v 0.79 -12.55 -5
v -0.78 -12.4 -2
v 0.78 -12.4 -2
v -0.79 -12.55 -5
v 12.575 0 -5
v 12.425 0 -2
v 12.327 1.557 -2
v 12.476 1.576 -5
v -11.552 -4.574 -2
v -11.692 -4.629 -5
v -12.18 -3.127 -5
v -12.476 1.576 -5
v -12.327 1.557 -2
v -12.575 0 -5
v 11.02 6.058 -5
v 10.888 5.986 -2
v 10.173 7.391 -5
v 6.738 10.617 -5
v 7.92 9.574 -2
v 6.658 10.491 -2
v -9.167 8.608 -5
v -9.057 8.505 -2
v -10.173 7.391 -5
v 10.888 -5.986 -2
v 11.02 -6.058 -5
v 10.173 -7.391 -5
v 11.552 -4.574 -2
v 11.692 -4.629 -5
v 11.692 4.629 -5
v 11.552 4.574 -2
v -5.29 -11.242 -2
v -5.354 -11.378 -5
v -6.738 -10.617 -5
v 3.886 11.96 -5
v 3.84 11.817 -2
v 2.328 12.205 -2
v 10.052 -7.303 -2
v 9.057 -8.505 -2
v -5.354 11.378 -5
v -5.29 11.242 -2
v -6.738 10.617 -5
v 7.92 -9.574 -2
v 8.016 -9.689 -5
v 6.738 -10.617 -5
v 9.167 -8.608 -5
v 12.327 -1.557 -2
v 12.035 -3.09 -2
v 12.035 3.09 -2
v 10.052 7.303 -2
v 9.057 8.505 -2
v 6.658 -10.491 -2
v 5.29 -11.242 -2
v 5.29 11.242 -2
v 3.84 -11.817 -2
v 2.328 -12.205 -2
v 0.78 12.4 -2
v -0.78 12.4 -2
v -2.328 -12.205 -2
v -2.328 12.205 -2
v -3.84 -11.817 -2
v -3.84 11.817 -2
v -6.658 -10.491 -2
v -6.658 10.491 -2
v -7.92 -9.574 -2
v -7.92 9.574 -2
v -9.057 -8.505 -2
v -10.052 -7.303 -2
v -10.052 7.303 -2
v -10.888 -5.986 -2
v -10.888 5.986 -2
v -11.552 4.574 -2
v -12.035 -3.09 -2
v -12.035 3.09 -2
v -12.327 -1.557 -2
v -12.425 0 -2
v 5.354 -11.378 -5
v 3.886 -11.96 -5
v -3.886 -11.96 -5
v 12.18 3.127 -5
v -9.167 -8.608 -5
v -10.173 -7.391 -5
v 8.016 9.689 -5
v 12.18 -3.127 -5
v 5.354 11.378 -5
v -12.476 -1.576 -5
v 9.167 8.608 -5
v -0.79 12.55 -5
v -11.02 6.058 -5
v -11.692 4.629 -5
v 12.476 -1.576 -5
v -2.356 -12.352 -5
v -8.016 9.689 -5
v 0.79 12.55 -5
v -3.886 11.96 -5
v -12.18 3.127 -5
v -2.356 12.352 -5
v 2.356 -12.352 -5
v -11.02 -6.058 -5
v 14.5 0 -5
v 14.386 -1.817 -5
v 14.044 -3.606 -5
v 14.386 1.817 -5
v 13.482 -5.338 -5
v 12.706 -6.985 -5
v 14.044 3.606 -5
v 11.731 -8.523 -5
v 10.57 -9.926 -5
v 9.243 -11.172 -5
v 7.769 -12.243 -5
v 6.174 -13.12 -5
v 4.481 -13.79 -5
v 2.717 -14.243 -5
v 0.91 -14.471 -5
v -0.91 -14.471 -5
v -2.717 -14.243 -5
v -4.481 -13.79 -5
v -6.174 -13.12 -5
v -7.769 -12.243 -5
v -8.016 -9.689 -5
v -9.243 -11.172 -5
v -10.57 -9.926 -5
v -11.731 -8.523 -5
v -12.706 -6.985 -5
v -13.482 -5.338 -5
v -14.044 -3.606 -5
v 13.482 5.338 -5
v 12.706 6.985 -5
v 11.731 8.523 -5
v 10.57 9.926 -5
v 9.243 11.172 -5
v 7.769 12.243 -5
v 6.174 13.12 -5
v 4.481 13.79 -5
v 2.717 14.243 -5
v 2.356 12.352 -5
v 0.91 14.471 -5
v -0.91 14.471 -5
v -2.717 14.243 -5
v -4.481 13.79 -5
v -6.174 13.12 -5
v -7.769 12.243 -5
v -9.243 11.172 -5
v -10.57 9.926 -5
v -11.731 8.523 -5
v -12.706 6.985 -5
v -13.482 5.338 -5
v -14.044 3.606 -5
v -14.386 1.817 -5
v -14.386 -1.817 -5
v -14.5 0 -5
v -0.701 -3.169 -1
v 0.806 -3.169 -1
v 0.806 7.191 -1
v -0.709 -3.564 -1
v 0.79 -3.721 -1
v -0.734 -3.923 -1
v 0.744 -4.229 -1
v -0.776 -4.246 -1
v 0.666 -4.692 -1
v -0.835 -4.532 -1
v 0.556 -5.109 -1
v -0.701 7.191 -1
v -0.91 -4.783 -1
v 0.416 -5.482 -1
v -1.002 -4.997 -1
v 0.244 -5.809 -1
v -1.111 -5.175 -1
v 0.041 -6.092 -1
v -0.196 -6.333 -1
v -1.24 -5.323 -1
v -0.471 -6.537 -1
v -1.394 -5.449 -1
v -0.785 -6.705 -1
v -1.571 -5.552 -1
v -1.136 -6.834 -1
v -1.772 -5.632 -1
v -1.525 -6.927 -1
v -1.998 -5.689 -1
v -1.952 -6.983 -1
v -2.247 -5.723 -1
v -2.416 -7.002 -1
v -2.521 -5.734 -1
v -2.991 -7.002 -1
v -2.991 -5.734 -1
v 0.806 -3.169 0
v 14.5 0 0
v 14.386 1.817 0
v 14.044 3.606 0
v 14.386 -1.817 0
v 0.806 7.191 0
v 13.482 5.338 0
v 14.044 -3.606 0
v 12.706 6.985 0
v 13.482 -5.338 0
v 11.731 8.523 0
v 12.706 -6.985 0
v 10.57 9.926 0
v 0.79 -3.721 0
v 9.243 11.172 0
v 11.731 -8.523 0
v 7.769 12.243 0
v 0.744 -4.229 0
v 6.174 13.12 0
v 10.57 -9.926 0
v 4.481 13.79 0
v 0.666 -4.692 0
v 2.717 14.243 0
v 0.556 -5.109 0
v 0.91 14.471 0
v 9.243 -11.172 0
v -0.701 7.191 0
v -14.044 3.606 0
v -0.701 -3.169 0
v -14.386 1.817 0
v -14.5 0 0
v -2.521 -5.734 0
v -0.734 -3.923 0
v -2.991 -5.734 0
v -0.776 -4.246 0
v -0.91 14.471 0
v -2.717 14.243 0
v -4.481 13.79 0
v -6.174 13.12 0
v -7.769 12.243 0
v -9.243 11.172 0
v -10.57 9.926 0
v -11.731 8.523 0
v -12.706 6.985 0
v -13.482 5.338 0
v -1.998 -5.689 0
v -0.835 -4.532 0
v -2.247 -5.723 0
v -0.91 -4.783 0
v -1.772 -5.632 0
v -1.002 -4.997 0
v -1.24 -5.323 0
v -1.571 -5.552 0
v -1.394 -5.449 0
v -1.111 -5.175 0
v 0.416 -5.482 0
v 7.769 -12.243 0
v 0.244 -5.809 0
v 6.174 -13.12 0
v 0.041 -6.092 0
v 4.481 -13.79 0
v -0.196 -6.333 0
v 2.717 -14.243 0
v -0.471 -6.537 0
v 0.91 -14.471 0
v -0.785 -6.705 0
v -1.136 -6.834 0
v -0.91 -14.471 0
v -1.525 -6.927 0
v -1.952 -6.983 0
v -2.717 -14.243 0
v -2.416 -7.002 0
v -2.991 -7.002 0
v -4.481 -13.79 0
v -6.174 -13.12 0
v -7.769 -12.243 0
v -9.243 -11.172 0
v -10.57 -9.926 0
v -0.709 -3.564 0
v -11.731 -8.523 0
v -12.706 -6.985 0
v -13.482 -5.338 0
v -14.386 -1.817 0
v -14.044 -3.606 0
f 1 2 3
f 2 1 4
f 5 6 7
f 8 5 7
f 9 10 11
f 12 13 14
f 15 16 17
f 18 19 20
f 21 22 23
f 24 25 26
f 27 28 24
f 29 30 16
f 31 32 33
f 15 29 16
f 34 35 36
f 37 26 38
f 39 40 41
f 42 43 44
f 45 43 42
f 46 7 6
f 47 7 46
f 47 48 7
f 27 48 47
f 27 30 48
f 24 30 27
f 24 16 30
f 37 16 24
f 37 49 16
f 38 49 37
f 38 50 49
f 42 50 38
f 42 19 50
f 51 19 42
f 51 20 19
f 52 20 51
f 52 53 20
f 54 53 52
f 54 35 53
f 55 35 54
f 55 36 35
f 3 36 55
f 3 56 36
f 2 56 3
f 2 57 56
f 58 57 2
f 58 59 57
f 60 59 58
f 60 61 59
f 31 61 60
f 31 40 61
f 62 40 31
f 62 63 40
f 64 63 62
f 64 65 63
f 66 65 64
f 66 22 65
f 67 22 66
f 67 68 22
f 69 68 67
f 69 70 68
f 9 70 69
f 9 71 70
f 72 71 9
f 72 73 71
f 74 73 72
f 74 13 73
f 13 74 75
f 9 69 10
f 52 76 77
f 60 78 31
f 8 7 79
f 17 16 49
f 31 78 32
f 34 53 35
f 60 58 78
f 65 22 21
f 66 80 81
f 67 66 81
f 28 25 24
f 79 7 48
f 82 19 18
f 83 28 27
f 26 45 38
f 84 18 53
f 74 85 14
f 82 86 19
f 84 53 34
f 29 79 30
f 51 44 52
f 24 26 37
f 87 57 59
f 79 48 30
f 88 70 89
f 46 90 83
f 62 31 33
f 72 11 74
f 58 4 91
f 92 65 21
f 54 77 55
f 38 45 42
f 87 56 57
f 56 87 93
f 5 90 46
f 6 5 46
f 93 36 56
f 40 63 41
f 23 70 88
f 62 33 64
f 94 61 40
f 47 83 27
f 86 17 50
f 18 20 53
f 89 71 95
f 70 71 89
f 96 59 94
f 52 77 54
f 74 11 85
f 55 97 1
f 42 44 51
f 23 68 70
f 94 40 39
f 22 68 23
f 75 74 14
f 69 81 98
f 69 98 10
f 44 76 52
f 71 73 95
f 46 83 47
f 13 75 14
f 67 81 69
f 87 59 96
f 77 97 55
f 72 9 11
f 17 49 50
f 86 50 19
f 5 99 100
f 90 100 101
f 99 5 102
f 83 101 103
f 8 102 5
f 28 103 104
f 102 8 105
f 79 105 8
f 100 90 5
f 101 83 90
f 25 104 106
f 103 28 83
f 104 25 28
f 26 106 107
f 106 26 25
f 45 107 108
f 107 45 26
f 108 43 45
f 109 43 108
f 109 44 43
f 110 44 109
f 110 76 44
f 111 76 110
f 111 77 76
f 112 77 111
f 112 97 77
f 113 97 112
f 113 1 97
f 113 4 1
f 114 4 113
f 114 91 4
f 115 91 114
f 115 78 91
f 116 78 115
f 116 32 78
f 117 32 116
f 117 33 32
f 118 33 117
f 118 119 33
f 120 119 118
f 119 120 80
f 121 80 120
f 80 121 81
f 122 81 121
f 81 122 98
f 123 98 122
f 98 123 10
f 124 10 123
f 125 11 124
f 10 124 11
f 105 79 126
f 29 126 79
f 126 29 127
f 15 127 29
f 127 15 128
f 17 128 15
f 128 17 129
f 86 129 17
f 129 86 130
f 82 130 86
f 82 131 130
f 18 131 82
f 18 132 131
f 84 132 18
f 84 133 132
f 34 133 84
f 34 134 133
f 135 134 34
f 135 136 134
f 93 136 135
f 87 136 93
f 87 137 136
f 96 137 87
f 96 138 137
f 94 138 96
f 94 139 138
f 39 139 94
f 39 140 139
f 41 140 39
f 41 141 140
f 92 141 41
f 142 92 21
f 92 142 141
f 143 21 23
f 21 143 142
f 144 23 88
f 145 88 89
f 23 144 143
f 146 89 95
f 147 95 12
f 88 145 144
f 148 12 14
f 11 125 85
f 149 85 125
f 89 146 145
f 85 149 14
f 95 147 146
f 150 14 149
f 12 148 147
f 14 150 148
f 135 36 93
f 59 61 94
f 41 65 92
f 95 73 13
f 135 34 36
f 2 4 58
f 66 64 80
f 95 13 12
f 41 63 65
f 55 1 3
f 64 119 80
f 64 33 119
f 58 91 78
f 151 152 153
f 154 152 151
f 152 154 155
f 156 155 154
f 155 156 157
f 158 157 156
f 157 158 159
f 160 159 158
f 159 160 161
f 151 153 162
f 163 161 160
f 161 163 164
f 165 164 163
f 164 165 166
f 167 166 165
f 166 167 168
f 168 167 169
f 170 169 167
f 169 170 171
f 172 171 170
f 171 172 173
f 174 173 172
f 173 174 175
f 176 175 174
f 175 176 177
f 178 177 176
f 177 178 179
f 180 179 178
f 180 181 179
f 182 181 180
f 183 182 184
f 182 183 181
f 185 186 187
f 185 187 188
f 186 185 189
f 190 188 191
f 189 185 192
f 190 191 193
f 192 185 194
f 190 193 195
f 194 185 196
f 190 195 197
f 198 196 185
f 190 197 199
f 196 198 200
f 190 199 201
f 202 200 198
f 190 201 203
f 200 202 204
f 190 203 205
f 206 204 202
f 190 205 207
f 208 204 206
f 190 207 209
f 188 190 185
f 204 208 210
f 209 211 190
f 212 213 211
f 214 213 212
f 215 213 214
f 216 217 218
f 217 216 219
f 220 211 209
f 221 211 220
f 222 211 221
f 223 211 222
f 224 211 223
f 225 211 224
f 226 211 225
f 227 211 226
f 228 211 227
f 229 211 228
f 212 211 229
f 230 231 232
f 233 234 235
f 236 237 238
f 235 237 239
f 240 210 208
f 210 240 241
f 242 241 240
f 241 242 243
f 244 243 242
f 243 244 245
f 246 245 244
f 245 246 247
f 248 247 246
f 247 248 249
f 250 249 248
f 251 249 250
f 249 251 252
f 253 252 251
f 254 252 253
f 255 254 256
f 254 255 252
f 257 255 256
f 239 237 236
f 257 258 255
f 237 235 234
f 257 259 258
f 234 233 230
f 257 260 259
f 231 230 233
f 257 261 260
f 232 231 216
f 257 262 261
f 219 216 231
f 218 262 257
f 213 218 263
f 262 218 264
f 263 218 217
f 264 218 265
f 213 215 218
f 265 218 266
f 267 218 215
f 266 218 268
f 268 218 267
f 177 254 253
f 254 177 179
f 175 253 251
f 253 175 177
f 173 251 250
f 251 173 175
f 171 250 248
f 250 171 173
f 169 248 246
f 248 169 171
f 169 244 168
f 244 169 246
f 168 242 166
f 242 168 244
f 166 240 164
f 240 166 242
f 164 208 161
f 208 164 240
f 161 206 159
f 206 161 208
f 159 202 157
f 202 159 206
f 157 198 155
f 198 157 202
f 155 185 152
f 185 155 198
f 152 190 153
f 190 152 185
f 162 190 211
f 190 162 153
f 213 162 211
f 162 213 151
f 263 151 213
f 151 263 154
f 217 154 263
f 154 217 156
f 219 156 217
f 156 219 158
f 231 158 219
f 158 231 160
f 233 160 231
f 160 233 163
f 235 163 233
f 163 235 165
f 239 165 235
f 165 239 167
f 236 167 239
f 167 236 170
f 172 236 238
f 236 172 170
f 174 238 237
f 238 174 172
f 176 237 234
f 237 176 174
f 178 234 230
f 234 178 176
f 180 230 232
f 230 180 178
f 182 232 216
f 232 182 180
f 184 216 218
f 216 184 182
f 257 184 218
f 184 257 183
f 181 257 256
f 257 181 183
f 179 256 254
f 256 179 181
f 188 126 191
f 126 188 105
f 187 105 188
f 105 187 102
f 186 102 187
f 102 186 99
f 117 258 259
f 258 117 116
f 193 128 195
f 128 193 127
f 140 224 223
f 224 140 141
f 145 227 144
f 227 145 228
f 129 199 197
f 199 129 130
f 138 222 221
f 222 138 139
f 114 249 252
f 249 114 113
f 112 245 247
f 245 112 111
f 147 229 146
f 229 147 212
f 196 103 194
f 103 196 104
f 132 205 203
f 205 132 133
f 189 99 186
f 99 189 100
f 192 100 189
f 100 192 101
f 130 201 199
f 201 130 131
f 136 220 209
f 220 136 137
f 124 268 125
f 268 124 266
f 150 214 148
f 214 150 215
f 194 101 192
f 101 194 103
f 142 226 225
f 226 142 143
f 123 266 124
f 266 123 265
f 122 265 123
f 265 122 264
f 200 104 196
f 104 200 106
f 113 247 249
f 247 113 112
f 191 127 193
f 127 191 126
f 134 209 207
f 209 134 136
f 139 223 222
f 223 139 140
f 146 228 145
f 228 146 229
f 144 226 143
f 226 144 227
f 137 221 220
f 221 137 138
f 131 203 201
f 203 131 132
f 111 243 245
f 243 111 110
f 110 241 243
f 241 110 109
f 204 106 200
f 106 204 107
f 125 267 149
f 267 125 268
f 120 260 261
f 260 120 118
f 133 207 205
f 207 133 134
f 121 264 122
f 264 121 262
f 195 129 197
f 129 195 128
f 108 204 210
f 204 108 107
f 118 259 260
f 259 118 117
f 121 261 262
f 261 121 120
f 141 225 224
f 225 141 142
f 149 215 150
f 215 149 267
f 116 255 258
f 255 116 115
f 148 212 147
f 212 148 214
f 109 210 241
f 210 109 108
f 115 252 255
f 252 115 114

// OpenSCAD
$fn = 50;

difference() {
	union() {
		translate(v = [0, 0, -5.0]) {
			cylinder(h = 5, r = 14.5);
		}
	}
	union() {
		#translate(v = [0, 0, -5.0]) {
			cylinder(h = 3, r1 = 12.575, r2 = 12.425);
		}
		translate(v = [0, 0, -1]) {
			linear_extrude(height = 1) {
				text(font = "Wingdings", halign = "center", size = 11, text = "J", valign = "center");
			}
		}
	}
}
